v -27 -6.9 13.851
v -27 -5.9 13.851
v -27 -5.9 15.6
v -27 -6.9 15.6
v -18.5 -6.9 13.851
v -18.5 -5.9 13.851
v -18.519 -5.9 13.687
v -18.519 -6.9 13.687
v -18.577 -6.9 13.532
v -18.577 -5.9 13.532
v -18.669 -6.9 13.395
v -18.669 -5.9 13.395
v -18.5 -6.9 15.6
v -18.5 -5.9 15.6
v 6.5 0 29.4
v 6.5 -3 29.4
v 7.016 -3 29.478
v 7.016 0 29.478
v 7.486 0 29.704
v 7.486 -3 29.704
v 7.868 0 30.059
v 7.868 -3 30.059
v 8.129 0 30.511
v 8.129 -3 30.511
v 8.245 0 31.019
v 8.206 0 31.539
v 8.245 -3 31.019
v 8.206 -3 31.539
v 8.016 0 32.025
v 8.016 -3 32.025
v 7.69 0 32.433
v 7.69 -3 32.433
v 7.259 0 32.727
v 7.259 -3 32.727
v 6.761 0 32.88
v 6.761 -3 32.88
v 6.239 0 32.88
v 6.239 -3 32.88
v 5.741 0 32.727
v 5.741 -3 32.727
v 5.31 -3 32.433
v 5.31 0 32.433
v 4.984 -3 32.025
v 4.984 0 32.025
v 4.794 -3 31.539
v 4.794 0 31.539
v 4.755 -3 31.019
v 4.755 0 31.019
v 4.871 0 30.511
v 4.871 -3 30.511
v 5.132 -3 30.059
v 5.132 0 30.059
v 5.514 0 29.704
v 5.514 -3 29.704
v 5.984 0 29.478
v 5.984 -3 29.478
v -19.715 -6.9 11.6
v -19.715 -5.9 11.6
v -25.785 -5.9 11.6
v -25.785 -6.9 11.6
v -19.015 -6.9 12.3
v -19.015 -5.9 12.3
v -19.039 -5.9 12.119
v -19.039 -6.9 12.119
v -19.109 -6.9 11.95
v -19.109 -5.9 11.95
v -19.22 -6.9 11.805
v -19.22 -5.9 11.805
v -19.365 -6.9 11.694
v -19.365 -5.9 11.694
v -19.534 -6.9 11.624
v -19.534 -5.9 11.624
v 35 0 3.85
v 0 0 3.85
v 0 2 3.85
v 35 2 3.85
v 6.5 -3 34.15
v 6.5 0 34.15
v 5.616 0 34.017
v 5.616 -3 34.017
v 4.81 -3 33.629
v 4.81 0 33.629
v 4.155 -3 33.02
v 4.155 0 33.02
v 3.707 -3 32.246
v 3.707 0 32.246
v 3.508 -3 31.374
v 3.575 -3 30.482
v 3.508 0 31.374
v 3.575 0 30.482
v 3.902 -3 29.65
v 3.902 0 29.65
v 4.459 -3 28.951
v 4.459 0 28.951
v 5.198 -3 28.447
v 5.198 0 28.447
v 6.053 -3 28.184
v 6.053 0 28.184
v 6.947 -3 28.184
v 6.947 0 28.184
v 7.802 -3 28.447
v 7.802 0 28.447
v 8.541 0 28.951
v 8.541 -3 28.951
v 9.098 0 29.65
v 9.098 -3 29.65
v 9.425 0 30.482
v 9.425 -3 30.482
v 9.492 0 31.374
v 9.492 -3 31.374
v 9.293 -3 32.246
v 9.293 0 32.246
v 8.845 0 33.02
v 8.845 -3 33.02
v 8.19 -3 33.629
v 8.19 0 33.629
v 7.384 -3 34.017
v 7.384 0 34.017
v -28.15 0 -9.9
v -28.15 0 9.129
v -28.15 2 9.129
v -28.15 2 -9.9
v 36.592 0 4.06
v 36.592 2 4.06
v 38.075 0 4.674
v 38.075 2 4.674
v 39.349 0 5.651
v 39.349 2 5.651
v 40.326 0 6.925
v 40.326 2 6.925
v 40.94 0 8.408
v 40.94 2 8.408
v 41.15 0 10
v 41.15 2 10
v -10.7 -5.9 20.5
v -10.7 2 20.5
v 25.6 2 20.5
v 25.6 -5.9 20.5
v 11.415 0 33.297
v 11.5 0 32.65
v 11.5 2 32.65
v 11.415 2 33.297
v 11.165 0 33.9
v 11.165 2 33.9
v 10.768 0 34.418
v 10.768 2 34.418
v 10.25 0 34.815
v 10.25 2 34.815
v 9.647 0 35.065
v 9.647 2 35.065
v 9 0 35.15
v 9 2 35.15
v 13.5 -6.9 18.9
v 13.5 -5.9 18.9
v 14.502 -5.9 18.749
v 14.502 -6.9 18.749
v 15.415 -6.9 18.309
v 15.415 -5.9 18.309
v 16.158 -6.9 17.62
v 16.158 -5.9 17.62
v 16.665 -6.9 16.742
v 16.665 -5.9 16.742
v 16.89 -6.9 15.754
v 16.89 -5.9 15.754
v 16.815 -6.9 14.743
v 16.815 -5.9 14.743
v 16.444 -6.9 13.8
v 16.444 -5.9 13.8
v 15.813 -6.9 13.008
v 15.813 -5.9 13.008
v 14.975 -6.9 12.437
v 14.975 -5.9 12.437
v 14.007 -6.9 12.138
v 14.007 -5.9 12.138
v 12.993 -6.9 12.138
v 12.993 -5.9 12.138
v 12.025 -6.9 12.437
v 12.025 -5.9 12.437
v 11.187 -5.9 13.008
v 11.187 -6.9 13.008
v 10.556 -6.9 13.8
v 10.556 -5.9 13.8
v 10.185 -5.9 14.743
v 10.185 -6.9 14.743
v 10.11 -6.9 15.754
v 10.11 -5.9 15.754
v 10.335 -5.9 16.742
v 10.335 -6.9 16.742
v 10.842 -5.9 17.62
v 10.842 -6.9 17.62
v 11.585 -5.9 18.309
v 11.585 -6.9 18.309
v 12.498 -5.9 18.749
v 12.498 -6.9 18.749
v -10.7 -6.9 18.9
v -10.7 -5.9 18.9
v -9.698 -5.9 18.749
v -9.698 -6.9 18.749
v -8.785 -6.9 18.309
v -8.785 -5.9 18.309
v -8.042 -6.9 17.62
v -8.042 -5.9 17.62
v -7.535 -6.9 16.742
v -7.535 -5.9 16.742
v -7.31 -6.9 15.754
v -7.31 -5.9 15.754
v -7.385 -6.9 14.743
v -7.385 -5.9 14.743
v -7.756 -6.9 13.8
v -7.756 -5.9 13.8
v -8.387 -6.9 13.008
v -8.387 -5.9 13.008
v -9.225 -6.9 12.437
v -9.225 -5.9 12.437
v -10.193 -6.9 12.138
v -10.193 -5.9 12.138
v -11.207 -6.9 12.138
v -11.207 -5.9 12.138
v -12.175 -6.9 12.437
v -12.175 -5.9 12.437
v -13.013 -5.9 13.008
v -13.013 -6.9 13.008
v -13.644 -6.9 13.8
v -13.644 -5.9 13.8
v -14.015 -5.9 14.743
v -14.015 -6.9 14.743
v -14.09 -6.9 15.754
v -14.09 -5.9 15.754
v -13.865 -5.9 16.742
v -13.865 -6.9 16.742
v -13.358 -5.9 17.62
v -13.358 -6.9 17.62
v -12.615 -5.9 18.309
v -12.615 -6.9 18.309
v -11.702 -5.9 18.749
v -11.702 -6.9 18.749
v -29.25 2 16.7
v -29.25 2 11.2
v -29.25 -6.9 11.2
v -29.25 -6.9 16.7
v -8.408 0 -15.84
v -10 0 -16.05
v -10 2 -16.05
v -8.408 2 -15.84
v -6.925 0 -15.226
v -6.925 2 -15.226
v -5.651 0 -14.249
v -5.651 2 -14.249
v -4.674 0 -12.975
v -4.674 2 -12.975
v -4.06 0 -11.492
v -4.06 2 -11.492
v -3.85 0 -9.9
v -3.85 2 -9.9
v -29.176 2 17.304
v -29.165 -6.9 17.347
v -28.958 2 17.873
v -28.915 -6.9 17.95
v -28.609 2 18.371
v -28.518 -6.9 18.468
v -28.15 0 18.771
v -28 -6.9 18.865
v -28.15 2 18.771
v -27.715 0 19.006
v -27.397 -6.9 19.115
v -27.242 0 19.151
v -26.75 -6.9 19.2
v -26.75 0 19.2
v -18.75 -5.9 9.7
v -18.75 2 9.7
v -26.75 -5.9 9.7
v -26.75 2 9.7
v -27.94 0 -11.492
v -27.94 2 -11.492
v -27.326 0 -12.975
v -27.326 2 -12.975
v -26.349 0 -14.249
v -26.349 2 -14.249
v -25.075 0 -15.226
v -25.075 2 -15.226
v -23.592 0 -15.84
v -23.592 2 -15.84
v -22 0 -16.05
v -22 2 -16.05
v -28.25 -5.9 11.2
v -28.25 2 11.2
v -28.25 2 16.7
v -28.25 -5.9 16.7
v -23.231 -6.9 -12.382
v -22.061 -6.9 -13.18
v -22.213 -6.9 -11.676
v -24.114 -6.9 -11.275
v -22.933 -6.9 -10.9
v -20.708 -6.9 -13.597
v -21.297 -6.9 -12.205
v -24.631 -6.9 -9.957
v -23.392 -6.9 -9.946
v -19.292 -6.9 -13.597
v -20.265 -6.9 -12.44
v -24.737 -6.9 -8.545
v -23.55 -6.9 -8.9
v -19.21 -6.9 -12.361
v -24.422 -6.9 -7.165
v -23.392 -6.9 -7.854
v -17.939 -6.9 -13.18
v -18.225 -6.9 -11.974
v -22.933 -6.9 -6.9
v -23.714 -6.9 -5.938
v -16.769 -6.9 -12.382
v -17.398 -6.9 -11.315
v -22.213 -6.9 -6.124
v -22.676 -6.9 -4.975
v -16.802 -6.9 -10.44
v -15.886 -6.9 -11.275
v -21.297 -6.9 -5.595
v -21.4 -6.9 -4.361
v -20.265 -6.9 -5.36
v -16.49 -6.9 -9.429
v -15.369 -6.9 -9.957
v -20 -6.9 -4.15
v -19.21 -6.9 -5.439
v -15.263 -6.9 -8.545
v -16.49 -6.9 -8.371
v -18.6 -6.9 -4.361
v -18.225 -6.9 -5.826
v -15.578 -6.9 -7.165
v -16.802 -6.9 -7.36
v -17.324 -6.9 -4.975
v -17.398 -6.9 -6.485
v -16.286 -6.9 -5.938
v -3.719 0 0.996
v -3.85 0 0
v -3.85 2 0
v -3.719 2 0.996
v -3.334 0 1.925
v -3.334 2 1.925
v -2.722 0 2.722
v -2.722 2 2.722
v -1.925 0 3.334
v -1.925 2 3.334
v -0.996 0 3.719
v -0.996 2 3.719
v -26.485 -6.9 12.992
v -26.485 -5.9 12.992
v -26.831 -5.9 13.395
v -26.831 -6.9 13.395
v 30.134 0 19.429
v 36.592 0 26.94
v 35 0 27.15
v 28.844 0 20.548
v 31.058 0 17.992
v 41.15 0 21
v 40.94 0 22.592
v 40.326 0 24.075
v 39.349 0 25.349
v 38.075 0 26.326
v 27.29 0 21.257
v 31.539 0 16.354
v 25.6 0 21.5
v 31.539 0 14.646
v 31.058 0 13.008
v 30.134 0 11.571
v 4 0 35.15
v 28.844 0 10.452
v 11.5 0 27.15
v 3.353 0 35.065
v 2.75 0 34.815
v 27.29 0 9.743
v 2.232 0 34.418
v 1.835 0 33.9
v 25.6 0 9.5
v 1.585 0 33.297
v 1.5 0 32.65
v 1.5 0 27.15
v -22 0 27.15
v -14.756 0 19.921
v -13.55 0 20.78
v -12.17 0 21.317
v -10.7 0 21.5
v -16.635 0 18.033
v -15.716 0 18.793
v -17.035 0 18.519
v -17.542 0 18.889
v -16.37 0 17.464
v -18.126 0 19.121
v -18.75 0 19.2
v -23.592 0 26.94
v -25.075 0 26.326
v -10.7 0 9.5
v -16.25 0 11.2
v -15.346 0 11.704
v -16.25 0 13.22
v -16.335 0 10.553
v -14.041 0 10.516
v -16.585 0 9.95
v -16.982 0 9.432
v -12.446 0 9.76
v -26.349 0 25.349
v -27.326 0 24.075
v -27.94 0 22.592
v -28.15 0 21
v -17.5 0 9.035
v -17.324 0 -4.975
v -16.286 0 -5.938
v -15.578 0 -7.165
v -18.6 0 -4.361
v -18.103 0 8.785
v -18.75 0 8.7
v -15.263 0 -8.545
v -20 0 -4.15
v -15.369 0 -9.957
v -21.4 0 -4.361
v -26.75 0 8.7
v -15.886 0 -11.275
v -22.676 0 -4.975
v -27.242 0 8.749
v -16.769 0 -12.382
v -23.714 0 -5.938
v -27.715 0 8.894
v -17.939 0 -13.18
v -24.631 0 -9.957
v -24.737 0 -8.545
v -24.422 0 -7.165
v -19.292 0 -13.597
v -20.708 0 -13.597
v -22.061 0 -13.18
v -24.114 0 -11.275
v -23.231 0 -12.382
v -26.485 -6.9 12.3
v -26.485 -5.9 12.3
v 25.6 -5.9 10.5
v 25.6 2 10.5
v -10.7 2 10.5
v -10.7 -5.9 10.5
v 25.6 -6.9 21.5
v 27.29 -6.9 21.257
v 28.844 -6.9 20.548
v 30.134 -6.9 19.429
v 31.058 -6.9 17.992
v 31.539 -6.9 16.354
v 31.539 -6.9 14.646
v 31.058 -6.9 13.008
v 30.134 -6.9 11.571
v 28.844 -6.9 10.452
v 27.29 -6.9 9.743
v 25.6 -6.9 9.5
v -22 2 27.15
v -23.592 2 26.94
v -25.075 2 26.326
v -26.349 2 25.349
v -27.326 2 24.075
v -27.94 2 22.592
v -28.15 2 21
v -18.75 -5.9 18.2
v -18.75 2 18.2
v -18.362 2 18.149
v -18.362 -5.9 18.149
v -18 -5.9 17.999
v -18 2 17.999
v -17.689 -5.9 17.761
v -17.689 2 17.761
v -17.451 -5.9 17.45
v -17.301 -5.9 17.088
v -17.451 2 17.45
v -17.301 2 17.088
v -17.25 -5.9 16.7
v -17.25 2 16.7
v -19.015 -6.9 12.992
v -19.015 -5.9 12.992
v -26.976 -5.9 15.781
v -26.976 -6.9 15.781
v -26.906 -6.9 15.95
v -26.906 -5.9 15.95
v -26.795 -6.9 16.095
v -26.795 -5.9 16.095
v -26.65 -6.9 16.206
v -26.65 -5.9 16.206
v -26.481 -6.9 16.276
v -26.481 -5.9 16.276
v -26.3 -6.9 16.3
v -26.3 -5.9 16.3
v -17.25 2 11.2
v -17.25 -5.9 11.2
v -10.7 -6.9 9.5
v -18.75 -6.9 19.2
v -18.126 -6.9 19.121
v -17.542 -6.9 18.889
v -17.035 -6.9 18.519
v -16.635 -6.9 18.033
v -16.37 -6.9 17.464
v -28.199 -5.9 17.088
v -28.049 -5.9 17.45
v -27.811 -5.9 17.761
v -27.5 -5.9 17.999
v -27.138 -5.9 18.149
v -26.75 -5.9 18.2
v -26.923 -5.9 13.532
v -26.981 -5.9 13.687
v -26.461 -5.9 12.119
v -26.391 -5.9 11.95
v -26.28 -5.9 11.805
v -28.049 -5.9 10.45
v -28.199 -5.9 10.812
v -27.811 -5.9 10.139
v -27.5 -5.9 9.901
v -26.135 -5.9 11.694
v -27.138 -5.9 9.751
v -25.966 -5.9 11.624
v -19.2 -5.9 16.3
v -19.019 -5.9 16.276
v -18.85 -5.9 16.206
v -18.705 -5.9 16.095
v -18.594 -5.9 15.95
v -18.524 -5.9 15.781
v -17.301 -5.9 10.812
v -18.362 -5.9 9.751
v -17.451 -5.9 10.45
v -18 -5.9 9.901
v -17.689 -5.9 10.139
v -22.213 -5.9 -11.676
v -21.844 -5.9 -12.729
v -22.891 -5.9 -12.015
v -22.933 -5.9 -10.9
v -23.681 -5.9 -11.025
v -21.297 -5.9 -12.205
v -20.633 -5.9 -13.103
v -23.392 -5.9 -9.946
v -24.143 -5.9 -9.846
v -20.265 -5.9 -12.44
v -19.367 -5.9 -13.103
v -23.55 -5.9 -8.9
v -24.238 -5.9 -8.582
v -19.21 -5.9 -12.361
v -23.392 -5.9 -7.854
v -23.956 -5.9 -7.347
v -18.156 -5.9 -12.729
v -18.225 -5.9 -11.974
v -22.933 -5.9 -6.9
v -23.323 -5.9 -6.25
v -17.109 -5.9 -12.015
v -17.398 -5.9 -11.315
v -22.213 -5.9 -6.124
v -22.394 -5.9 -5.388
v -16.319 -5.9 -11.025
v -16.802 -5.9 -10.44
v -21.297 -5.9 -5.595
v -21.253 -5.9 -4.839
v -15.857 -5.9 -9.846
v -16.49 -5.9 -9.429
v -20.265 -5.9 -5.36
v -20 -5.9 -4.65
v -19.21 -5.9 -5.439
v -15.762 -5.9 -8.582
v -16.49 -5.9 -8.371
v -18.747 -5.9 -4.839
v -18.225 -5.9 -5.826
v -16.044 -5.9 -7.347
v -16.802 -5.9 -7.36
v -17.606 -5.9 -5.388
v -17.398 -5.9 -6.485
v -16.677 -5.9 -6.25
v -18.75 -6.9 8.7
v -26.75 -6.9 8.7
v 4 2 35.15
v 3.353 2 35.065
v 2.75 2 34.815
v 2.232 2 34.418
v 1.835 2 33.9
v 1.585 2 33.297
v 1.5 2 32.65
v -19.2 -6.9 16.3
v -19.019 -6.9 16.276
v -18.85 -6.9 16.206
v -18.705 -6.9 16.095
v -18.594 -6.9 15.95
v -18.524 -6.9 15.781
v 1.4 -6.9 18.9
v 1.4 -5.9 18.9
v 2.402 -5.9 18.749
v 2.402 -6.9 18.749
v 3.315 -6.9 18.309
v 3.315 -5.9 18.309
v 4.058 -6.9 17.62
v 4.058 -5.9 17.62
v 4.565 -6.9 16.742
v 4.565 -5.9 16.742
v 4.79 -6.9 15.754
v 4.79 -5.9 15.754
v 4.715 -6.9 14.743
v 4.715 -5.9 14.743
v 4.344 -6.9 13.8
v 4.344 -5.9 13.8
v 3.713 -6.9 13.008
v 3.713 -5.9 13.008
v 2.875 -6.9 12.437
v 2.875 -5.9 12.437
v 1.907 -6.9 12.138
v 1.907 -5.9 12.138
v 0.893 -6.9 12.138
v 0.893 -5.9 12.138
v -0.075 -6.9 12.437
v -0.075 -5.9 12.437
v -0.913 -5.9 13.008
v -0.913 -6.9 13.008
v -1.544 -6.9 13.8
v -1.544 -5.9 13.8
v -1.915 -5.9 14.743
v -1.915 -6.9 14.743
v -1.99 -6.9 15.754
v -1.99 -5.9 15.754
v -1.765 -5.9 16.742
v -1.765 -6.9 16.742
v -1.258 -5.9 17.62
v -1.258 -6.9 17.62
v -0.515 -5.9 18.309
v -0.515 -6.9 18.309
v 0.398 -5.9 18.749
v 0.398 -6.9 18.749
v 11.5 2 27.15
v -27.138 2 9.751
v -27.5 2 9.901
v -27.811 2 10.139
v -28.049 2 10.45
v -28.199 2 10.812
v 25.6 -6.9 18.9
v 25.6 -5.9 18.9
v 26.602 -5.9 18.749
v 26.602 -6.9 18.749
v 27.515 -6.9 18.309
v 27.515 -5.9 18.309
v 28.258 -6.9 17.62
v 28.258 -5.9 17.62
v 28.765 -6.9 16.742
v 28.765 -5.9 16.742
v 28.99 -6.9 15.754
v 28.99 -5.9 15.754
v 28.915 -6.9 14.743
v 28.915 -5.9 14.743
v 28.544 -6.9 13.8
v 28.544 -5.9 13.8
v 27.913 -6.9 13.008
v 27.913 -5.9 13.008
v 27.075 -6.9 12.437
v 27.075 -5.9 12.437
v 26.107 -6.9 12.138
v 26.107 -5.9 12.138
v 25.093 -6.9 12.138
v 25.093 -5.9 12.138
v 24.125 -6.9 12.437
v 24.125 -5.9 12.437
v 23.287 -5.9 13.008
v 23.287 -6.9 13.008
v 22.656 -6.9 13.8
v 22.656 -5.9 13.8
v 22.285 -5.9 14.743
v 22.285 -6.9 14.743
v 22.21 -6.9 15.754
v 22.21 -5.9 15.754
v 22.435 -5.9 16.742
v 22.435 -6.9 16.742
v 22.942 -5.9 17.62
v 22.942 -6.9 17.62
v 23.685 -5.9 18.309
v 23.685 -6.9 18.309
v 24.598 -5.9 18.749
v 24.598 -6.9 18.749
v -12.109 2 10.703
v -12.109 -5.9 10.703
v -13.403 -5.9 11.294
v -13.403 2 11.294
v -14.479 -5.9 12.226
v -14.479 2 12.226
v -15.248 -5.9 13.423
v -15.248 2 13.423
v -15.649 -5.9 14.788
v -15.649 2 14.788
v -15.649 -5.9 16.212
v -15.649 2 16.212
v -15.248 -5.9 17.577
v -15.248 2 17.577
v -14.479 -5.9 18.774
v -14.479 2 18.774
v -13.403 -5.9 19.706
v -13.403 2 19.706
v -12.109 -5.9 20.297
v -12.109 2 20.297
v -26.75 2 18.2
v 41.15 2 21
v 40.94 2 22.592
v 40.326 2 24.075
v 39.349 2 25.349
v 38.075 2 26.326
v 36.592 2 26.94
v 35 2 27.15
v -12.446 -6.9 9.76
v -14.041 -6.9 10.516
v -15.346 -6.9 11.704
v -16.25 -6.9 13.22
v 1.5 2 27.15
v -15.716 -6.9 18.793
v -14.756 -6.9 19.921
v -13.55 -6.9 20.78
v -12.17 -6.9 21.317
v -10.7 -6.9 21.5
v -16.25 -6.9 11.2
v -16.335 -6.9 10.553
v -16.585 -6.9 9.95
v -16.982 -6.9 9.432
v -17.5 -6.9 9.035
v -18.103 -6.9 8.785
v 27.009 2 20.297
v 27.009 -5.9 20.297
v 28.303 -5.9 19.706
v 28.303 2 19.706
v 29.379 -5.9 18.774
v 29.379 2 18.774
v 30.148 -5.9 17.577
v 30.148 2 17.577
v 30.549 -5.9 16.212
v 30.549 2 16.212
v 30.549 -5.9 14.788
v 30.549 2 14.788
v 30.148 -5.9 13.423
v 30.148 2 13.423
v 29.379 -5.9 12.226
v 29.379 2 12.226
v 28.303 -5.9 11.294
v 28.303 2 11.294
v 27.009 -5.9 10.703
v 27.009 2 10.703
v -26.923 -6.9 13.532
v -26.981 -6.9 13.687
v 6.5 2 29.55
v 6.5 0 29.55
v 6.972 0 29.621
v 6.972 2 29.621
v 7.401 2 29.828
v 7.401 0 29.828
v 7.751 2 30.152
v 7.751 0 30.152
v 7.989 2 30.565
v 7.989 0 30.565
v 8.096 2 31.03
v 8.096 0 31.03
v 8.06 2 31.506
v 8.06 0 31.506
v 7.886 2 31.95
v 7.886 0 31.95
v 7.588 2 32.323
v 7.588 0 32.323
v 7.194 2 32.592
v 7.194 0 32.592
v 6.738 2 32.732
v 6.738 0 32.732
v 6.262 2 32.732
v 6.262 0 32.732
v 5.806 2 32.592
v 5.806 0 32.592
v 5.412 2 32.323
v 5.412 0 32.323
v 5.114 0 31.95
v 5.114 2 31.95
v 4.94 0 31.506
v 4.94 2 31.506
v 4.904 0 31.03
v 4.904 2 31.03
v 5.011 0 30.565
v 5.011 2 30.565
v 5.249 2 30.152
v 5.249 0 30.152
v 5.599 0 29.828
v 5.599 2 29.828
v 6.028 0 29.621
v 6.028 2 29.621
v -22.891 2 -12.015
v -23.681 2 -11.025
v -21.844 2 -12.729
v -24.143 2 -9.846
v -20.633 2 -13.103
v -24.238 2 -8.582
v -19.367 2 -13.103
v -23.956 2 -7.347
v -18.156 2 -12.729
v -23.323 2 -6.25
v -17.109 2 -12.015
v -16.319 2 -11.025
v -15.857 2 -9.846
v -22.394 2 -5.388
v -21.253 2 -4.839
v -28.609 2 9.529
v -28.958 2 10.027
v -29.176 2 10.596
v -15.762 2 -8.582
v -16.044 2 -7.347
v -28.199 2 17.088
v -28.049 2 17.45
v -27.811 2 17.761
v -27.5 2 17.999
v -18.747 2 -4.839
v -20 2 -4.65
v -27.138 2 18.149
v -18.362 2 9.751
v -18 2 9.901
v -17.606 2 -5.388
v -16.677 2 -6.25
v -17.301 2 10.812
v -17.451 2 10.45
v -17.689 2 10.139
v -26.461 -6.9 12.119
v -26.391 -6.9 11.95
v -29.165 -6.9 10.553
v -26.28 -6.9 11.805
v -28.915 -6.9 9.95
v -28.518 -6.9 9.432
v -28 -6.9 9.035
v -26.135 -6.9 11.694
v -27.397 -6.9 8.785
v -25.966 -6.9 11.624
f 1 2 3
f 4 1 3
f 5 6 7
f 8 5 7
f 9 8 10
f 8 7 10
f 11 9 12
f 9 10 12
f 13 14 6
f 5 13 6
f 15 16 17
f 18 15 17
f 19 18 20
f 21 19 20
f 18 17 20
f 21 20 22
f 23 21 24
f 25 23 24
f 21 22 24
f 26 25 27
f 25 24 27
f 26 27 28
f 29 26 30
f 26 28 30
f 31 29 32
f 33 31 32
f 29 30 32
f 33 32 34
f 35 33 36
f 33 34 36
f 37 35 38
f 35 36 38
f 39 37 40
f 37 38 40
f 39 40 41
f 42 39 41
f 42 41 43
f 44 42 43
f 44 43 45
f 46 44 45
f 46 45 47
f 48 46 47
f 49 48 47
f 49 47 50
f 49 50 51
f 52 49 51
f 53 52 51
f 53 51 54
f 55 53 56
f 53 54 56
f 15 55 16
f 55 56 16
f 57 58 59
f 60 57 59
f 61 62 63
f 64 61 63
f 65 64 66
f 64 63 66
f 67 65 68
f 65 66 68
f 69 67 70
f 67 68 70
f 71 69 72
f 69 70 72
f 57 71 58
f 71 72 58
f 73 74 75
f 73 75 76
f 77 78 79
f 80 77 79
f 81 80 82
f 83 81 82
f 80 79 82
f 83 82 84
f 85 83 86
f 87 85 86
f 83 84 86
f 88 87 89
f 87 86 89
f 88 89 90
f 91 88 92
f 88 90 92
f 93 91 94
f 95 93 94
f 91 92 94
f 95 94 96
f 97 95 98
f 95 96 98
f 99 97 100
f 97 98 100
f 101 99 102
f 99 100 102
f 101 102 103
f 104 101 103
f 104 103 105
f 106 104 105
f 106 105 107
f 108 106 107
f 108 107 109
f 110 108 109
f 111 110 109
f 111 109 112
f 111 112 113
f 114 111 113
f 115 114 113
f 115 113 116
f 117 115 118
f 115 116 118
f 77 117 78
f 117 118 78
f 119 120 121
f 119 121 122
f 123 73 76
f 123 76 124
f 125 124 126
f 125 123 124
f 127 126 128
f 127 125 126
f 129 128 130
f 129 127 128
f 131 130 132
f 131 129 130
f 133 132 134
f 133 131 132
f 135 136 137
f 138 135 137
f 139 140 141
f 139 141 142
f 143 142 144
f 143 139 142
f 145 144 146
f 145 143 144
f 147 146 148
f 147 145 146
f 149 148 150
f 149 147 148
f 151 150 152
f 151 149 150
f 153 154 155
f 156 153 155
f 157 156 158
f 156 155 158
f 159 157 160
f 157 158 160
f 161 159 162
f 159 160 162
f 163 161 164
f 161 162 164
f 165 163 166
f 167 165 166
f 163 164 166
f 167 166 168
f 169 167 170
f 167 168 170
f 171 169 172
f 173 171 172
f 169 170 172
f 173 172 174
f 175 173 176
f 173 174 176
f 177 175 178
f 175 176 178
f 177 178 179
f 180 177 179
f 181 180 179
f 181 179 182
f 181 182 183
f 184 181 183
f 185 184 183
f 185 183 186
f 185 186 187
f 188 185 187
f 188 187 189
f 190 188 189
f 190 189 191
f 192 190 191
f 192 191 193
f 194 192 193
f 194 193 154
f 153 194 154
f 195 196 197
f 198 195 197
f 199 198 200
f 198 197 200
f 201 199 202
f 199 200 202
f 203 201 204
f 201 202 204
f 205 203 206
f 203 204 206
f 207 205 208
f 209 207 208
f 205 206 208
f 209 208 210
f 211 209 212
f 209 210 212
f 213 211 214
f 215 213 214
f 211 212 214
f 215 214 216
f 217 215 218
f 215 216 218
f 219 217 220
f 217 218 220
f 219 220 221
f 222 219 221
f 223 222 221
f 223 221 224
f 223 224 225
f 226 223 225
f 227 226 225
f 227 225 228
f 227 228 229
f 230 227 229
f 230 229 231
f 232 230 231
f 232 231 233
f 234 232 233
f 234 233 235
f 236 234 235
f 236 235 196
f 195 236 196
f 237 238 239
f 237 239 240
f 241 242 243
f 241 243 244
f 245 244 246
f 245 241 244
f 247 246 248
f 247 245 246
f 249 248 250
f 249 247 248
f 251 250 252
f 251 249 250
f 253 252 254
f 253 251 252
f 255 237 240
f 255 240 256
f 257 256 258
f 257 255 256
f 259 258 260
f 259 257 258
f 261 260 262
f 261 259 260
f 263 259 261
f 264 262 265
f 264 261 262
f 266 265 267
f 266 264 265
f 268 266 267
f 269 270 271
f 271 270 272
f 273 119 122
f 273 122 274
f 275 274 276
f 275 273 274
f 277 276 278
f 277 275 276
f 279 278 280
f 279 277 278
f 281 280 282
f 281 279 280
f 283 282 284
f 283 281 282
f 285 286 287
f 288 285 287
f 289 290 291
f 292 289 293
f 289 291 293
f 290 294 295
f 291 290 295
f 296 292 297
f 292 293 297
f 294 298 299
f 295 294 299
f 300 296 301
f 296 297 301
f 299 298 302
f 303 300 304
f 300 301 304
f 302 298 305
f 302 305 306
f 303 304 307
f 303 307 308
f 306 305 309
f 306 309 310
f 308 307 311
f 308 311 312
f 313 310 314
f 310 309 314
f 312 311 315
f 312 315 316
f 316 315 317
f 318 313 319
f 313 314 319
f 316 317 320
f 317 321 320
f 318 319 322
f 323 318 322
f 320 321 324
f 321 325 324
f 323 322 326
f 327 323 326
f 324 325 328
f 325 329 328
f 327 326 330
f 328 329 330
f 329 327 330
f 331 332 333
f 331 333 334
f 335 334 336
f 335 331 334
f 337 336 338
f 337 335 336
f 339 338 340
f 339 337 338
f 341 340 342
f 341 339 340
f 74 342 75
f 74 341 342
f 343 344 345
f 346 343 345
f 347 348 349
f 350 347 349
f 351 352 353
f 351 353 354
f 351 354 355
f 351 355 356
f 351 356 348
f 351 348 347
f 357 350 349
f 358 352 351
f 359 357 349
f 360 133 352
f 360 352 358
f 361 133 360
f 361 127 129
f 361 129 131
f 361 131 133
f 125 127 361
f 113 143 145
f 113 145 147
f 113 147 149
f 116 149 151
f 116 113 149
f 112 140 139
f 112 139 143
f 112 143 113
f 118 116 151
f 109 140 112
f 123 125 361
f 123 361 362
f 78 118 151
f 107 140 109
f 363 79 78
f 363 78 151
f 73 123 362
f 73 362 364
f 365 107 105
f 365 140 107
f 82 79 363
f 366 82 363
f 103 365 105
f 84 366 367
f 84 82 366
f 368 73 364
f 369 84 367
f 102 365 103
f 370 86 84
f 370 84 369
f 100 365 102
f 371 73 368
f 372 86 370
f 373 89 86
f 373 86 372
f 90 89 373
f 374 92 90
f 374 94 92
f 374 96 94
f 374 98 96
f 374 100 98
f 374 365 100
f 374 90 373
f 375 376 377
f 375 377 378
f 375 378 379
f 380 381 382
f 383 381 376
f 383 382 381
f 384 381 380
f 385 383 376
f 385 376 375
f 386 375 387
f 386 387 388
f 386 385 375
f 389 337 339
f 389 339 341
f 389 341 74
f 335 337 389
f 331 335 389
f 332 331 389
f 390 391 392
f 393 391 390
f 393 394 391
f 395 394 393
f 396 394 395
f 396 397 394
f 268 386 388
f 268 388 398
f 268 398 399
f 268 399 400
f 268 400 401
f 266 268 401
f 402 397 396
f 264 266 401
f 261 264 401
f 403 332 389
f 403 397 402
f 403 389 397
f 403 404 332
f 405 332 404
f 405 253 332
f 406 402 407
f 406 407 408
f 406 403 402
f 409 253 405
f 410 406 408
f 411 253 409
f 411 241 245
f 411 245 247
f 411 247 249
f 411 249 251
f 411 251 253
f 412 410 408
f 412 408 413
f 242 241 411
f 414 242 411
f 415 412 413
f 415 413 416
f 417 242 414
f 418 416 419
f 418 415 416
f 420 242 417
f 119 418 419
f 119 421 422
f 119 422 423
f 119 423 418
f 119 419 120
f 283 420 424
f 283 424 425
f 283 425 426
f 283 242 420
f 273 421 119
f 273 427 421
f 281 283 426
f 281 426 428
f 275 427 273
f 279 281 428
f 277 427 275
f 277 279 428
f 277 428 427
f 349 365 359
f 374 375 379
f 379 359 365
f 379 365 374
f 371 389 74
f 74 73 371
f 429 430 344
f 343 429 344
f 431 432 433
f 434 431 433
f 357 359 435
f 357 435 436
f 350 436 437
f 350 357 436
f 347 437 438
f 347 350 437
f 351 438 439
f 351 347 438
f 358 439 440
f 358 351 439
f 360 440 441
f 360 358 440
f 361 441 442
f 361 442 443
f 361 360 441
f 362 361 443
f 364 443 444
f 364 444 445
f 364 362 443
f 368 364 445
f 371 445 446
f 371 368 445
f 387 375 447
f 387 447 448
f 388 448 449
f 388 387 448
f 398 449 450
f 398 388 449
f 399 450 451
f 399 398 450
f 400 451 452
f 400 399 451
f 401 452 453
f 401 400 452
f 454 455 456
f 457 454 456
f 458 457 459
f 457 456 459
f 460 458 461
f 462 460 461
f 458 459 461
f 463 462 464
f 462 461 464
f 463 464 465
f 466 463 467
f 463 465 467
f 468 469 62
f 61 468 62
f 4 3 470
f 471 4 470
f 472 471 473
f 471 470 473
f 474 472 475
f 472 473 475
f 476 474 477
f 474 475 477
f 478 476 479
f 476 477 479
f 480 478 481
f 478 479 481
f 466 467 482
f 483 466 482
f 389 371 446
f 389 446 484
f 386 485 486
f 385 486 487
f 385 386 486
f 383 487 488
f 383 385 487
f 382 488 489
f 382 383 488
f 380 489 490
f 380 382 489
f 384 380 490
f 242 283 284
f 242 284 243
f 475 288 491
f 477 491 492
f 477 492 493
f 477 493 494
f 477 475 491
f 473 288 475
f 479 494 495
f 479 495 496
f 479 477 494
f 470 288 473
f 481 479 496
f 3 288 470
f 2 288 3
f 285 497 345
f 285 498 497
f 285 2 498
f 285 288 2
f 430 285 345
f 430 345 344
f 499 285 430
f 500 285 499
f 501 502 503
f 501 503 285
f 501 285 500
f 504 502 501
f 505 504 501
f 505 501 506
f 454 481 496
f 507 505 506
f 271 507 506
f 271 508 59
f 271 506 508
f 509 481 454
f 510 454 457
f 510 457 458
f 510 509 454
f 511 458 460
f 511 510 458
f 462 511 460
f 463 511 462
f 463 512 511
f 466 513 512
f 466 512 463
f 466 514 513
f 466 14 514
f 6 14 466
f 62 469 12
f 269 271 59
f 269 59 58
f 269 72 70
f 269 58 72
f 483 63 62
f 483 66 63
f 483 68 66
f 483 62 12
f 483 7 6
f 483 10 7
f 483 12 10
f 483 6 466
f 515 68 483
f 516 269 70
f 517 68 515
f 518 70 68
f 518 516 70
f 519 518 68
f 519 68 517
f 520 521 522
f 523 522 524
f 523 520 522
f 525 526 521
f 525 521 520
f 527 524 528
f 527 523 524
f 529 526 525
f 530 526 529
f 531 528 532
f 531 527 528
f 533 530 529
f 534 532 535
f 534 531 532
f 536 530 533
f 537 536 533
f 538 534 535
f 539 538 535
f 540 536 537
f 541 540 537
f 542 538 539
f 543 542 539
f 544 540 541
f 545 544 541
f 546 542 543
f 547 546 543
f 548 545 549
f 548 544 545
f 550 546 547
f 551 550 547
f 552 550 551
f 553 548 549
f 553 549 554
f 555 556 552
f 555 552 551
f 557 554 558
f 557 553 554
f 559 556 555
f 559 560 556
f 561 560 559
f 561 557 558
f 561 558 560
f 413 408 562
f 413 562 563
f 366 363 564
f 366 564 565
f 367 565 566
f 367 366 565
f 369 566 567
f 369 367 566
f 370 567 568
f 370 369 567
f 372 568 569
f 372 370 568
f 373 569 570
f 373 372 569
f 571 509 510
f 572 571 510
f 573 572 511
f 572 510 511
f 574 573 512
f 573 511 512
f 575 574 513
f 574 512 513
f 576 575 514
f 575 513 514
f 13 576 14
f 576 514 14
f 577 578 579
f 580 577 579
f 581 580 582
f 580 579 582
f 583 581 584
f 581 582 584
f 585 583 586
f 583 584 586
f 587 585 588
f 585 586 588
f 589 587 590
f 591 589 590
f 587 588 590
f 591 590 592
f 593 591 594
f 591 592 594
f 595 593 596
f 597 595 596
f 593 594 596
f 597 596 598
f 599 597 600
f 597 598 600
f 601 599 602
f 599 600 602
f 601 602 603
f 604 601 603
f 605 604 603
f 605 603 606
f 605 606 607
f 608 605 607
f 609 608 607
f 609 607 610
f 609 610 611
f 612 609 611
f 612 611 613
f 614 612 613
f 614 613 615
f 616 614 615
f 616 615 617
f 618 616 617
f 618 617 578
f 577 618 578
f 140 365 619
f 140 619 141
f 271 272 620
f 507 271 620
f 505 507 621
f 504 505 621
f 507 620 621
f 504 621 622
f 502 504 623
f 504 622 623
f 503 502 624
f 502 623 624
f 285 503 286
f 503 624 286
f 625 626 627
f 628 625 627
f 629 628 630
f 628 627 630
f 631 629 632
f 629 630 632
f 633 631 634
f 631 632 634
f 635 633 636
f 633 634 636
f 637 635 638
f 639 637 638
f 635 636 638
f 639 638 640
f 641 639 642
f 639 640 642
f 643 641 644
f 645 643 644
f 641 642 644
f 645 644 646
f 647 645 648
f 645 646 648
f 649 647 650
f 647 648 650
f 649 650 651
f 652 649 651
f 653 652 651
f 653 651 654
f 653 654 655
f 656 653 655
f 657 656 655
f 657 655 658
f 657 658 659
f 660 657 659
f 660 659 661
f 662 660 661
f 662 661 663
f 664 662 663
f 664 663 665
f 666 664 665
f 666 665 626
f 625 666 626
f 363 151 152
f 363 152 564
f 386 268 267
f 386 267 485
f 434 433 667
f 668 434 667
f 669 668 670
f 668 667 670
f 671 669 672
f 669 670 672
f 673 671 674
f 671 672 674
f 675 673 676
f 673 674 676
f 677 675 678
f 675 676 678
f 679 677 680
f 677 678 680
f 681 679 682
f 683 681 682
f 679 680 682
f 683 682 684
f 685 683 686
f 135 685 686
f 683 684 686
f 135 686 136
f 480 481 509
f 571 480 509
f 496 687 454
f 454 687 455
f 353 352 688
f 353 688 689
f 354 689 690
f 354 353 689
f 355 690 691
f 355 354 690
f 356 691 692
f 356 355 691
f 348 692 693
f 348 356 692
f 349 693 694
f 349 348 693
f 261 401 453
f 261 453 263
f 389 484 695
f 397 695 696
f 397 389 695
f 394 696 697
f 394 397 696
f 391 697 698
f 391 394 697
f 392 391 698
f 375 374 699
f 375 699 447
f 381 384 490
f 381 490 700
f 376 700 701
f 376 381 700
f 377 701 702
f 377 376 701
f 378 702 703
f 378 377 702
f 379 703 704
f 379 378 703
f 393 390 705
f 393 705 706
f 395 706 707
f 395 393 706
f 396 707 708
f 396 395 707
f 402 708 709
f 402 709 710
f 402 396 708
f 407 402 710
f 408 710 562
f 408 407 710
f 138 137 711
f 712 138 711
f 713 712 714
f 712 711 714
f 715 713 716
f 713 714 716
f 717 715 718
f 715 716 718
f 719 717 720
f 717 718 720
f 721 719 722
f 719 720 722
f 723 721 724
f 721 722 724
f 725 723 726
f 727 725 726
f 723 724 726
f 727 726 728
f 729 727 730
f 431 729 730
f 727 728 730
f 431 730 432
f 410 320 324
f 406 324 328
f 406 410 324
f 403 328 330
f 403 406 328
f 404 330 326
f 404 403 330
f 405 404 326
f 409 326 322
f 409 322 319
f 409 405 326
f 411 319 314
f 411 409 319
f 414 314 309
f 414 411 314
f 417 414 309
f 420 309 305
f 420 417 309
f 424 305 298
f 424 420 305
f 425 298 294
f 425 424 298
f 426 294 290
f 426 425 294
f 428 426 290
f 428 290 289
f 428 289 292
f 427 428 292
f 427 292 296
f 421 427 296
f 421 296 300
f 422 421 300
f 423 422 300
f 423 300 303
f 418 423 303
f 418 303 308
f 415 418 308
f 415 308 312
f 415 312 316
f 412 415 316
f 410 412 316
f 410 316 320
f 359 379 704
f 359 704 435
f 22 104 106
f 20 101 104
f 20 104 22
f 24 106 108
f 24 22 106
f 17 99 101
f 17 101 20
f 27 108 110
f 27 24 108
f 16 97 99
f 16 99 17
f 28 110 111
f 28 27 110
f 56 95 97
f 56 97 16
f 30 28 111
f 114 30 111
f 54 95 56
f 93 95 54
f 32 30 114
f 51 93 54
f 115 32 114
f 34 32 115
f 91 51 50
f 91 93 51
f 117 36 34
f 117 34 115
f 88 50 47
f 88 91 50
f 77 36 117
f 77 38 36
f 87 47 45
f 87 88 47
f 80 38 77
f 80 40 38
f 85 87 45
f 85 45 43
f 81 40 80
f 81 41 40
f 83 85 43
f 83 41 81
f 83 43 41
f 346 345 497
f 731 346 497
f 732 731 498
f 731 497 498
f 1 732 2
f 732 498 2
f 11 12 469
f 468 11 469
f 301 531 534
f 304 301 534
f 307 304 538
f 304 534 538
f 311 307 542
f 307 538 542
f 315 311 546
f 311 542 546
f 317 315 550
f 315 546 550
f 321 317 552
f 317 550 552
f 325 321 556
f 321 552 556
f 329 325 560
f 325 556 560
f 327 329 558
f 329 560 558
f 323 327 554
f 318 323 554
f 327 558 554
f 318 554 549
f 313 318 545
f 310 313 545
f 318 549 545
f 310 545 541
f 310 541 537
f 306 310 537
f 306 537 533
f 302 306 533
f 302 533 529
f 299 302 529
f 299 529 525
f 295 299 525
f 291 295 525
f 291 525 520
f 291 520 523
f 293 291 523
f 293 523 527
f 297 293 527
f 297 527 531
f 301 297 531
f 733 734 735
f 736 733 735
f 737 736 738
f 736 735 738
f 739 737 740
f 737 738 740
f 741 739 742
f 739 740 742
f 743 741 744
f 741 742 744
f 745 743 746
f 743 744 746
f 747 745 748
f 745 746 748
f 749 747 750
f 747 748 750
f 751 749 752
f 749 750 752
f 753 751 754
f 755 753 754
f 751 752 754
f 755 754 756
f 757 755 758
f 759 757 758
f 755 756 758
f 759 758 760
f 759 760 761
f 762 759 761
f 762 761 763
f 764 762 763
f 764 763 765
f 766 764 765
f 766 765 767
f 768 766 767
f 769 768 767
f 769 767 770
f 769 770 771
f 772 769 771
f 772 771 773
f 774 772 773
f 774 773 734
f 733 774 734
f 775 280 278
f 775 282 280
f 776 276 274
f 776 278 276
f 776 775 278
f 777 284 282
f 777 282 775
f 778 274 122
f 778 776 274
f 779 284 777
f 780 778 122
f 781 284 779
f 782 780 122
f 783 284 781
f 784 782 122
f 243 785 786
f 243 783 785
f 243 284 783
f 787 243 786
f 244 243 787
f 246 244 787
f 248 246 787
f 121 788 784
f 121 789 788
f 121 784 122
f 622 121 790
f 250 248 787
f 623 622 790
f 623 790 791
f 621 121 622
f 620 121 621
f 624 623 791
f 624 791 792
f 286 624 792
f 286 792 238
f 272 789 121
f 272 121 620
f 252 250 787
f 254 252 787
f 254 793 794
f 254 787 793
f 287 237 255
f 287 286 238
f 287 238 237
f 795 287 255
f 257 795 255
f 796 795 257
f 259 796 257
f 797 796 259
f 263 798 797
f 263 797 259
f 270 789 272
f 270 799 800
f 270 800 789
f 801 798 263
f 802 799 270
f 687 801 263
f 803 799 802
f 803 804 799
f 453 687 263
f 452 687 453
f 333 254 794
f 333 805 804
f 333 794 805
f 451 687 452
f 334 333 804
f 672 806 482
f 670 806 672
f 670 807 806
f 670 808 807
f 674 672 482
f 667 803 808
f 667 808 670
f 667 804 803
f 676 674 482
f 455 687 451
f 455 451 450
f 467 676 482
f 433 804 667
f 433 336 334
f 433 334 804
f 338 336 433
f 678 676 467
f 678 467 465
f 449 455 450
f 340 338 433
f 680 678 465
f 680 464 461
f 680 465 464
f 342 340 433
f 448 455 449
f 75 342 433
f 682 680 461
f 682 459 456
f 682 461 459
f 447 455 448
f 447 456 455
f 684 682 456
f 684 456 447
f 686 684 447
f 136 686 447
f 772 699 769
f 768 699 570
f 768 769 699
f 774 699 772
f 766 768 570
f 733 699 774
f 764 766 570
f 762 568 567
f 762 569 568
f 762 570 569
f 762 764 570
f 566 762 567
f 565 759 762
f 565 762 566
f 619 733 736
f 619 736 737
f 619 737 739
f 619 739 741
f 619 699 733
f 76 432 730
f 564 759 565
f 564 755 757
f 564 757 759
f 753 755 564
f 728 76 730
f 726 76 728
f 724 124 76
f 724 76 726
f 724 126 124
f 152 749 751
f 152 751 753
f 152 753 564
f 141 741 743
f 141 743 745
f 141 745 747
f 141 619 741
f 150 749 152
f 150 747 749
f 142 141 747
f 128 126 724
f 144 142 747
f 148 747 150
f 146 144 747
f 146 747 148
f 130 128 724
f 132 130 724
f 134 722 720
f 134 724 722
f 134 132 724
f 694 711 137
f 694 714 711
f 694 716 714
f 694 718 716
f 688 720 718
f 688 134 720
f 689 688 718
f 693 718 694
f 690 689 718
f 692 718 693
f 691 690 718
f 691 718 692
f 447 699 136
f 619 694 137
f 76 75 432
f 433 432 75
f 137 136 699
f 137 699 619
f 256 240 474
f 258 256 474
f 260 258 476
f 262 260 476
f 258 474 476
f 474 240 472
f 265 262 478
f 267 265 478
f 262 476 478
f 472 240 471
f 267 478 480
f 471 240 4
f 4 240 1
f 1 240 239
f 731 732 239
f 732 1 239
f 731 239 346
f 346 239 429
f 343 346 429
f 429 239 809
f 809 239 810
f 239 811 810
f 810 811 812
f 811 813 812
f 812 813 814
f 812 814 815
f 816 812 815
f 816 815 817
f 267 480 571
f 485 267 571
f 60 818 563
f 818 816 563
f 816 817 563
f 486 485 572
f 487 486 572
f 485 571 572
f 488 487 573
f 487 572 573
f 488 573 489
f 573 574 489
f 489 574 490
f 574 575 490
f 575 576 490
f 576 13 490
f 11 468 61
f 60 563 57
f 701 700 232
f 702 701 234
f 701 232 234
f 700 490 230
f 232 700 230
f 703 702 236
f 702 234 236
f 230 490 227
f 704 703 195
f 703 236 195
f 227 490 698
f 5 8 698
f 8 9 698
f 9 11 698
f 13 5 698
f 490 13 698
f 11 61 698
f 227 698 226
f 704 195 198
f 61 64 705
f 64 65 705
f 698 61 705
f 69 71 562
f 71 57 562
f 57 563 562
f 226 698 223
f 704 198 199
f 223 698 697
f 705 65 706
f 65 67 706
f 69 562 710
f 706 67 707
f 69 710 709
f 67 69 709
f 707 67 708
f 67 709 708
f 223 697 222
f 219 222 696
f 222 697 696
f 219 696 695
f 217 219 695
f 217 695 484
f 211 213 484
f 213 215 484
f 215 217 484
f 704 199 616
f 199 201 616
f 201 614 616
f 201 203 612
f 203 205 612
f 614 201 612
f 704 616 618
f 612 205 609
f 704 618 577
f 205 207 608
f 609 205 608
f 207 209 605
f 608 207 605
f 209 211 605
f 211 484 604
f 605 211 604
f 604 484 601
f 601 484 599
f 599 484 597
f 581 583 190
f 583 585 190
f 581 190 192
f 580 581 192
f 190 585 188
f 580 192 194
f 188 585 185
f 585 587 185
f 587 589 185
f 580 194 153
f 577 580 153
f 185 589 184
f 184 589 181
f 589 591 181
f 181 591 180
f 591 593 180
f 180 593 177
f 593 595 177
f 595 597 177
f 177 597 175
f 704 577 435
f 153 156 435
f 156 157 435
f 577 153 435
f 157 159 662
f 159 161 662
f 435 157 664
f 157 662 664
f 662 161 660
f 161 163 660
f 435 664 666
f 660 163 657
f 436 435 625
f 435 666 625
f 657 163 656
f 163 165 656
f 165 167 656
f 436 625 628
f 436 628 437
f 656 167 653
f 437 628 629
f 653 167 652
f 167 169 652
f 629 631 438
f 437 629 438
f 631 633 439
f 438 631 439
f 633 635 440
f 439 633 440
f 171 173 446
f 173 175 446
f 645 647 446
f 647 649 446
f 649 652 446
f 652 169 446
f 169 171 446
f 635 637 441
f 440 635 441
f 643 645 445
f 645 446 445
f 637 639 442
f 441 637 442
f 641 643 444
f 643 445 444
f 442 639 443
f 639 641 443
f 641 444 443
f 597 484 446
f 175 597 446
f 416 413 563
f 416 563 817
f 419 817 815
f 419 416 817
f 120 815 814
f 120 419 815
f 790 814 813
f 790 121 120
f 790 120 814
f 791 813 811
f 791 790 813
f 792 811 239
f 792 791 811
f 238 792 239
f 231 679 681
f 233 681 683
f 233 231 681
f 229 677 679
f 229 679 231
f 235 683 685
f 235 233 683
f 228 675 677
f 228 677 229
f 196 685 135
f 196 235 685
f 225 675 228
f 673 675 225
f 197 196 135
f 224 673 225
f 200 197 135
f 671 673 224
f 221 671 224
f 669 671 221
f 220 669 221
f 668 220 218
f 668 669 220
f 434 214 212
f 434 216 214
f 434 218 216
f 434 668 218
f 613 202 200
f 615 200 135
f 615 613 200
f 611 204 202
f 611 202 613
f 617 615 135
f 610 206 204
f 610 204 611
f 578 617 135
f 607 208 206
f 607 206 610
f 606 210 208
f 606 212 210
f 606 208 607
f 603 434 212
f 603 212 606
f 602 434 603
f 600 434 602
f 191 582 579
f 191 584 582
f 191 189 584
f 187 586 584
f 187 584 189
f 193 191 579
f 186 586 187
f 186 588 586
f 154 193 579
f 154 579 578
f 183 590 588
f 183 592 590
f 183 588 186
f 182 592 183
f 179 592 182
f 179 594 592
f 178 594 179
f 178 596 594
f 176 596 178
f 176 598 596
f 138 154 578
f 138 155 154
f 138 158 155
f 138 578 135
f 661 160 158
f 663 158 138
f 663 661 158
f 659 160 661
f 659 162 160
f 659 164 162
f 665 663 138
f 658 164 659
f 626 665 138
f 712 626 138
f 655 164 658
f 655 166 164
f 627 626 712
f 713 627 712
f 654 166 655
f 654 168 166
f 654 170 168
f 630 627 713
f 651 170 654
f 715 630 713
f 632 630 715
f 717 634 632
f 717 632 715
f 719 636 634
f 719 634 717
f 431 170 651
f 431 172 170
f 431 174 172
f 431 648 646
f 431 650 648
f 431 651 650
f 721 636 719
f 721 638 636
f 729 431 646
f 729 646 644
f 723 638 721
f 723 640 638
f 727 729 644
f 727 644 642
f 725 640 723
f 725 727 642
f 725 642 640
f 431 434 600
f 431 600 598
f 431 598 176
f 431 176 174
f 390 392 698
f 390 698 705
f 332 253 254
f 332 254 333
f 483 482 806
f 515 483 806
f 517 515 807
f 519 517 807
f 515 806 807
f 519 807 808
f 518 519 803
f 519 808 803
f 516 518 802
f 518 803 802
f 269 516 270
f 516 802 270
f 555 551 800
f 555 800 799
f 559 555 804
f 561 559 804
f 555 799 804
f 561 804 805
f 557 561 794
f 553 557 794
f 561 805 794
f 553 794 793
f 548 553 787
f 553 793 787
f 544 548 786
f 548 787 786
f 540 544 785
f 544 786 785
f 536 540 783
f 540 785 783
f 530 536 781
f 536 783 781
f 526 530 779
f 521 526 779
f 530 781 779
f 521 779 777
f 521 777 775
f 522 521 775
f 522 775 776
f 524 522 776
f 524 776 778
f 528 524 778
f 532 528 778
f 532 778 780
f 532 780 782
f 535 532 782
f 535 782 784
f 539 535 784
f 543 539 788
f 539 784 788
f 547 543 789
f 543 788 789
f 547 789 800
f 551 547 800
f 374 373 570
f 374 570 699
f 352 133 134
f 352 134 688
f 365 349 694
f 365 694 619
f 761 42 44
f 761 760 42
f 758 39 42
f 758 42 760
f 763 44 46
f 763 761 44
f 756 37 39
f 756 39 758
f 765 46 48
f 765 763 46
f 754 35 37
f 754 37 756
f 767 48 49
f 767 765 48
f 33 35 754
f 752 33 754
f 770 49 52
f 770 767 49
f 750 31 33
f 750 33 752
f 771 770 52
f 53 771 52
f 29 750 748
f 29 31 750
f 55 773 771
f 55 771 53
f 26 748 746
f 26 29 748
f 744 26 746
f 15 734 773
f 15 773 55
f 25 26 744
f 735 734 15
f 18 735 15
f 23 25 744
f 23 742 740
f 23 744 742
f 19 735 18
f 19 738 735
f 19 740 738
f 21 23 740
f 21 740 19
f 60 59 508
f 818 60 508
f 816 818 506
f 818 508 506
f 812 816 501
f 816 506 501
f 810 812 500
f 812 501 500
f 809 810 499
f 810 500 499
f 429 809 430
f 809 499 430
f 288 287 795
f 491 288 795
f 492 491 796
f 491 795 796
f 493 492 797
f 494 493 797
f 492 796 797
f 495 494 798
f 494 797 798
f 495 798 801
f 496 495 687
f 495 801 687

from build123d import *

# Parameters (mm, degrees)
EXTRUDE_1_DEPTH     = 2
EXTRUDE_2_DEPTH     = 8.900017028
EXTRUDE_3_DEPTH     = 8.900017028
CUT_EXTRUDE_1_DEPTH = 7.900017028
CUT_EXTRUDE_2_DEPTH = 7.900017028
SKETCH_7_R          = 4.75
EXTRUDE_4_DEPTH     = 8.9000184
SKETCH_8_R          = 4.25
CUT_EXTRUDE_3_DEPTH = 7.9000184
SKETCH_9_R          = 3.4
CUT_EXTRUDE_4_DEPTH = 50.92850157
SKETCH_10_R         = 3.55
CUT_EXTRUDE_5_DEPTH = 50.928501787
CUT_EXTRUDE_6_DEPTH = 50.92850157
EXTRUDE_5_DEPTH     = 2
SKETCH_13_R         = 3
EXTRUDE_6_DEPTH     = 3
SKETCH_14_R         = 1.6
CUT_EXTRUDE_7_DEPTH = 55.349287024
SKETCH_15_R         = 1.75
CUT_EXTRUDE_8_DEPTH = 3


with BuildPart() as part:
    # Эскиз1 → Бобышка-Вытянуть1 (new body)
    with BuildSketch(Plane(origin=(0, 0, 0), x_dir=(1, 0, 0), z_dir=(0, 1, 0))):
        with BuildLine():
            Line((35, -27.15), (-22, -27.15))
            ThreePointArc((-22, -27.15), (-26.348706704, -25.348706704), (-28.15, -21))
            Line((-28.15, -21), (-28.15, 9.9))
            ThreePointArc((-28.15, 9.9), (-26.348706704, 14.248706704), (-22, 16.05))
            Line((-22, 16.05), (-10, 16.05))
            ThreePointArc((-10, 16.05), (-5.651293296, 14.248706704), (-3.85, 9.9))
            Line((-3.85, 9.9), (-3.85, 0))
            ThreePointArc((-3.85, 0), (-2.722361108, -2.722361108), (0, -3.85))
            Line((0, -3.85), (35, -3.85))
            ThreePointArc((35, -3.85), (39.348706704, -5.651293296), (41.15, -10))
            Line((41.15, -10), (41.15, -21))
            ThreePointArc((41.15, -21), (39.348706704, -25.348706704), (35, -27.15))
        make_face()
    extrude(amount=EXTRUDE_1_DEPTH)

    # Эскиз2 → Бобышка-Вытянуть2 (add)
    with BuildSketch(Plane(origin=(0, 2, 0), x_dir=(1, 0, 0), z_dir=(0, 1, 0))):
        with BuildLine():
            Line((-10.7, -21.5), (25.6, -21.5))
            ThreePointArc((25.6, -21.5), (31.6, -15.5), (25.6, -9.5))
            Line((25.6, -9.5), (-10.7, -9.5))
            ThreePointArc((-10.7, -9.5), (-16.7, -15.5), (-10.7, -21.5))
        make_face()
    extrude(amount=-EXTRUDE_2_DEPTH)

    # Эскиз3 → Бобышка-Вытянуть3 (add)
    with BuildSketch(Plane(origin=(0, 2, 0), x_dir=(1, 0, 0), z_dir=(0, 1, 0))):
        with BuildLine():
            Line((-26.75, -19.2), (-18.75, -19.2))
            ThreePointArc((-18.75, -19.2), (-16.982233047, -18.467766953), (-16.25, -16.7))
            Line((-16.25, -16.7), (-16.25, -11.2))
            ThreePointArc((-16.25, -11.2), (-16.982233047, -9.432233047), (-18.75, -8.7))
            Line((-18.75, -8.7), (-26.75, -8.7))
            ThreePointArc((-26.75, -8.7), (-28.517766953, -9.432233047), (-29.25, -11.2))
            Line((-29.25, -11.2), (-29.25, -16.7))
            ThreePointArc((-29.25, -16.7), (-28.517766953, -18.467766953), (-26.75, -19.2))
        make_face()
    extrude(amount=-EXTRUDE_3_DEPTH)

    # Эскиз5 → Вырез-Вытянуть1 (cut)
    with BuildSketch(Plane(origin=(0, 2, 0), x_dir=(1, 0, 0), z_dir=(0, 1, 0))):
        with BuildLine():
            Line((25.6, -10.5), (-10.7, -10.5))
            ThreePointArc((-10.7, -10.5), (-15.7, -15.5), (-10.7, -20.5))
            Line((-10.7, -20.5), (25.6, -20.5))
            ThreePointArc((25.6, -20.5), (30.6, -15.5), (25.6, -10.5))
        make_face()
    extrude(amount=-CUT_EXTRUDE_1_DEPTH, mode=Mode.SUBTRACT)

    # Эскиз6 → Вырез-Вытянуть2 (cut)
    with BuildSketch(Plane(origin=(0, 2, 0), x_dir=(1, 0, 0), z_dir=(0, 1, 0))):
        with BuildLine():
            Line((-17.25, -16.7), (-17.25, -11.2))
            ThreePointArc((-17.25, -11.2), (-17.689339828, -10.139339828), (-18.75, -9.7))
            Line((-18.75, -9.7), (-26.75, -9.7))
            ThreePointArc((-26.75, -9.7), (-27.810660172, -10.139339828), (-28.25, -11.2))
            Line((-28.25, -11.2), (-28.25, -16.7))
            ThreePointArc((-28.25, -16.7), (-27.810660172, -17.760660172), (-26.75, -18.2))
            Line((-26.75, -18.2), (-18.75, -18.2))
            ThreePointArc((-18.75, -18.2), (-17.689339828, -17.760660172), (-17.25, -16.7))
        make_face()
    extrude(amount=-CUT_EXTRUDE_2_DEPTH, mode=Mode.SUBTRACT)

    # Эскиз7 → Бобышка-Вытянуть4 (add)
    with BuildSketch(Plane(origin=(0, 2, 0), x_dir=(1, 0, 0), z_dir=(0, 1, 0))):
        with Locations(Location((-20, 8.9, 0), (0, 0, 270))):
            Circle(SKETCH_7_R)
    extrude(amount=-EXTRUDE_4_DEPTH)

    # Эскиз8 → Вырез-Вытянуть3 (cut)
    with BuildSketch(Plane(origin=(0, 2, 0), x_dir=(1, 0, 0), z_dir=(0, 1, 0))):
        with Locations(Location((-20, 8.9, 0), (0, 0, 270))):
            Circle(SKETCH_8_R)
    extrude(amount=-CUT_EXTRUDE_3_DEPTH, mode=Mode.SUBTRACT)

    # Эскиз9 → Вырез-Вытянуть4 (cut, through all)
    with BuildSketch(Plane(origin=(0, -5.900017028, 0), x_dir=(1, 0, 0), z_dir=(0, 1, 0))):
        with Locations(Location((-10.7, -15.5, 0), (0, 0, 270))):
            Circle(SKETCH_9_R)
        with Locations(Location((1.4, -15.5, 0), (0, 0, 270))):
            Circle(SKETCH_9_R)
        with Locations(Location((13.5, -15.5, 0), (0, 0, 270))):
            Circle(SKETCH_9_R)
        with Locations(Location((25.6, -15.5, 0), (0, 0, 270))):
            Circle(SKETCH_9_R)
    extrude(amount=-CUT_EXTRUDE_4_DEPTH, mode=Mode.SUBTRACT)

    # Эскиз10 → Вырез-Вытянуть5 (cut, through all)
    with BuildSketch(Plane(origin=(0, -5.9000184, 0), x_dir=(1, 0, 0), z_dir=(0, 1, 0))):
        with Locations(Location((-20, 8.9, 0), (0, 0, 180))):
            Circle(SKETCH_10_R)
    extrude(amount=-CUT_EXTRUDE_5_DEPTH, mode=Mode.SUBTRACT)

    # Эскиз11 → Вырез-Вытянуть6 (cut, through all)
    with BuildSketch(Plane(origin=(0, -5.900017028, 0), x_dir=(1, 0, 0), z_dir=(0, 1, 0))):
        with BuildLine():
            Line((-27, -13.851263122), (-27, -15.6))
            ThreePointArc((-27, -15.6), (-26.794974747, -16.094974747), (-26.3, -16.3))
            Line((-26.3, -16.3), (-19.2, -16.3))
            ThreePointArc((-19.2, -16.3), (-18.705025253, -16.094974747), (-18.5, -15.6))
            Line((-18.5, -15.6), (-18.5, -13.851263122))
            ThreePointArc((-18.5, -13.851263122), (-18.543563814, -13.608175619), (-18.668832955, -13.395344741))
            Line((-18.668832955, -13.395344741), (-19.015, -12.992043329))
            Line((-19.015, -12.992043329), (-19.015, -12.3))
            ThreePointArc((-19.015, -12.3), (-19.220025253, -11.805025253), (-19.715, -11.6))
            Line((-19.715, -11.6), (-25.785, -11.6))
            ThreePointArc((-25.785, -11.6), (-26.279974747, -11.805025253), (-26.485, -12.3))
            Line((-26.485, -12.3), (-26.485, -12.992043329))
            Line((-26.485, -12.992043329), (-26.831167045, -13.395344741))
            ThreePointArc((-26.831167045, -13.395344741), (-26.956436186, -13.608175619), (-27, -13.851263122))
        make_face()
    extrude(amount=-CUT_EXTRUDE_6_DEPTH, mode=Mode.SUBTRACT)

    # Эскиз12 → Бобышка-Вытянуть5 (add)
    with BuildSketch(Plane.XZ):
        with BuildLine():
            Line((1.5, 27.15), (11.5, 27.15))
            Line((11.5, 27.15), (11.5, 32.65))
            ThreePointArc((11.5, 32.65), (10.767766953, 34.417766953), (9, 35.15))
            Line((9, 35.15), (4, 35.15))
            ThreePointArc((4, 35.15), (2.232233047, 34.417766953), (1.5, 32.65))
            Line((1.5, 32.65), (1.5, 27.15))
        make_face()
    extrude(amount=-EXTRUDE_5_DEPTH)

    # Эскиз13 → Бобышка-Вытянуть6 (add)
    with BuildSketch(Plane.XZ):
        with Locations(Location((6.5, 31.15, 0), (0, 0, 90))):
            Circle(SKETCH_13_R)
    extrude(amount=EXTRUDE_6_DEPTH)

    # Эскиз14 → Вырез-Вытянуть7 (cut, through all)
    with BuildSketch(Plane.XZ.offset(3)):
        with Locations(Location((6.5, 31.15, 0), (0, 0, 270))):
            Circle(SKETCH_14_R)
    extrude(amount=-CUT_EXTRUDE_7_DEPTH, mode=Mode.SUBTRACT)

    # Эскиз15 → Вырез-Вытянуть8 (cut)
    with BuildSketch(Plane.XZ.offset(3)):
        with Locations(Location((6.5, 31.15, 0), (0, 0, 270))):
            Circle(SKETCH_15_R)
    extrude(amount=-CUT_EXTRUDE_8_DEPTH, mode=Mode.SUBTRACT)


solid = part.part
